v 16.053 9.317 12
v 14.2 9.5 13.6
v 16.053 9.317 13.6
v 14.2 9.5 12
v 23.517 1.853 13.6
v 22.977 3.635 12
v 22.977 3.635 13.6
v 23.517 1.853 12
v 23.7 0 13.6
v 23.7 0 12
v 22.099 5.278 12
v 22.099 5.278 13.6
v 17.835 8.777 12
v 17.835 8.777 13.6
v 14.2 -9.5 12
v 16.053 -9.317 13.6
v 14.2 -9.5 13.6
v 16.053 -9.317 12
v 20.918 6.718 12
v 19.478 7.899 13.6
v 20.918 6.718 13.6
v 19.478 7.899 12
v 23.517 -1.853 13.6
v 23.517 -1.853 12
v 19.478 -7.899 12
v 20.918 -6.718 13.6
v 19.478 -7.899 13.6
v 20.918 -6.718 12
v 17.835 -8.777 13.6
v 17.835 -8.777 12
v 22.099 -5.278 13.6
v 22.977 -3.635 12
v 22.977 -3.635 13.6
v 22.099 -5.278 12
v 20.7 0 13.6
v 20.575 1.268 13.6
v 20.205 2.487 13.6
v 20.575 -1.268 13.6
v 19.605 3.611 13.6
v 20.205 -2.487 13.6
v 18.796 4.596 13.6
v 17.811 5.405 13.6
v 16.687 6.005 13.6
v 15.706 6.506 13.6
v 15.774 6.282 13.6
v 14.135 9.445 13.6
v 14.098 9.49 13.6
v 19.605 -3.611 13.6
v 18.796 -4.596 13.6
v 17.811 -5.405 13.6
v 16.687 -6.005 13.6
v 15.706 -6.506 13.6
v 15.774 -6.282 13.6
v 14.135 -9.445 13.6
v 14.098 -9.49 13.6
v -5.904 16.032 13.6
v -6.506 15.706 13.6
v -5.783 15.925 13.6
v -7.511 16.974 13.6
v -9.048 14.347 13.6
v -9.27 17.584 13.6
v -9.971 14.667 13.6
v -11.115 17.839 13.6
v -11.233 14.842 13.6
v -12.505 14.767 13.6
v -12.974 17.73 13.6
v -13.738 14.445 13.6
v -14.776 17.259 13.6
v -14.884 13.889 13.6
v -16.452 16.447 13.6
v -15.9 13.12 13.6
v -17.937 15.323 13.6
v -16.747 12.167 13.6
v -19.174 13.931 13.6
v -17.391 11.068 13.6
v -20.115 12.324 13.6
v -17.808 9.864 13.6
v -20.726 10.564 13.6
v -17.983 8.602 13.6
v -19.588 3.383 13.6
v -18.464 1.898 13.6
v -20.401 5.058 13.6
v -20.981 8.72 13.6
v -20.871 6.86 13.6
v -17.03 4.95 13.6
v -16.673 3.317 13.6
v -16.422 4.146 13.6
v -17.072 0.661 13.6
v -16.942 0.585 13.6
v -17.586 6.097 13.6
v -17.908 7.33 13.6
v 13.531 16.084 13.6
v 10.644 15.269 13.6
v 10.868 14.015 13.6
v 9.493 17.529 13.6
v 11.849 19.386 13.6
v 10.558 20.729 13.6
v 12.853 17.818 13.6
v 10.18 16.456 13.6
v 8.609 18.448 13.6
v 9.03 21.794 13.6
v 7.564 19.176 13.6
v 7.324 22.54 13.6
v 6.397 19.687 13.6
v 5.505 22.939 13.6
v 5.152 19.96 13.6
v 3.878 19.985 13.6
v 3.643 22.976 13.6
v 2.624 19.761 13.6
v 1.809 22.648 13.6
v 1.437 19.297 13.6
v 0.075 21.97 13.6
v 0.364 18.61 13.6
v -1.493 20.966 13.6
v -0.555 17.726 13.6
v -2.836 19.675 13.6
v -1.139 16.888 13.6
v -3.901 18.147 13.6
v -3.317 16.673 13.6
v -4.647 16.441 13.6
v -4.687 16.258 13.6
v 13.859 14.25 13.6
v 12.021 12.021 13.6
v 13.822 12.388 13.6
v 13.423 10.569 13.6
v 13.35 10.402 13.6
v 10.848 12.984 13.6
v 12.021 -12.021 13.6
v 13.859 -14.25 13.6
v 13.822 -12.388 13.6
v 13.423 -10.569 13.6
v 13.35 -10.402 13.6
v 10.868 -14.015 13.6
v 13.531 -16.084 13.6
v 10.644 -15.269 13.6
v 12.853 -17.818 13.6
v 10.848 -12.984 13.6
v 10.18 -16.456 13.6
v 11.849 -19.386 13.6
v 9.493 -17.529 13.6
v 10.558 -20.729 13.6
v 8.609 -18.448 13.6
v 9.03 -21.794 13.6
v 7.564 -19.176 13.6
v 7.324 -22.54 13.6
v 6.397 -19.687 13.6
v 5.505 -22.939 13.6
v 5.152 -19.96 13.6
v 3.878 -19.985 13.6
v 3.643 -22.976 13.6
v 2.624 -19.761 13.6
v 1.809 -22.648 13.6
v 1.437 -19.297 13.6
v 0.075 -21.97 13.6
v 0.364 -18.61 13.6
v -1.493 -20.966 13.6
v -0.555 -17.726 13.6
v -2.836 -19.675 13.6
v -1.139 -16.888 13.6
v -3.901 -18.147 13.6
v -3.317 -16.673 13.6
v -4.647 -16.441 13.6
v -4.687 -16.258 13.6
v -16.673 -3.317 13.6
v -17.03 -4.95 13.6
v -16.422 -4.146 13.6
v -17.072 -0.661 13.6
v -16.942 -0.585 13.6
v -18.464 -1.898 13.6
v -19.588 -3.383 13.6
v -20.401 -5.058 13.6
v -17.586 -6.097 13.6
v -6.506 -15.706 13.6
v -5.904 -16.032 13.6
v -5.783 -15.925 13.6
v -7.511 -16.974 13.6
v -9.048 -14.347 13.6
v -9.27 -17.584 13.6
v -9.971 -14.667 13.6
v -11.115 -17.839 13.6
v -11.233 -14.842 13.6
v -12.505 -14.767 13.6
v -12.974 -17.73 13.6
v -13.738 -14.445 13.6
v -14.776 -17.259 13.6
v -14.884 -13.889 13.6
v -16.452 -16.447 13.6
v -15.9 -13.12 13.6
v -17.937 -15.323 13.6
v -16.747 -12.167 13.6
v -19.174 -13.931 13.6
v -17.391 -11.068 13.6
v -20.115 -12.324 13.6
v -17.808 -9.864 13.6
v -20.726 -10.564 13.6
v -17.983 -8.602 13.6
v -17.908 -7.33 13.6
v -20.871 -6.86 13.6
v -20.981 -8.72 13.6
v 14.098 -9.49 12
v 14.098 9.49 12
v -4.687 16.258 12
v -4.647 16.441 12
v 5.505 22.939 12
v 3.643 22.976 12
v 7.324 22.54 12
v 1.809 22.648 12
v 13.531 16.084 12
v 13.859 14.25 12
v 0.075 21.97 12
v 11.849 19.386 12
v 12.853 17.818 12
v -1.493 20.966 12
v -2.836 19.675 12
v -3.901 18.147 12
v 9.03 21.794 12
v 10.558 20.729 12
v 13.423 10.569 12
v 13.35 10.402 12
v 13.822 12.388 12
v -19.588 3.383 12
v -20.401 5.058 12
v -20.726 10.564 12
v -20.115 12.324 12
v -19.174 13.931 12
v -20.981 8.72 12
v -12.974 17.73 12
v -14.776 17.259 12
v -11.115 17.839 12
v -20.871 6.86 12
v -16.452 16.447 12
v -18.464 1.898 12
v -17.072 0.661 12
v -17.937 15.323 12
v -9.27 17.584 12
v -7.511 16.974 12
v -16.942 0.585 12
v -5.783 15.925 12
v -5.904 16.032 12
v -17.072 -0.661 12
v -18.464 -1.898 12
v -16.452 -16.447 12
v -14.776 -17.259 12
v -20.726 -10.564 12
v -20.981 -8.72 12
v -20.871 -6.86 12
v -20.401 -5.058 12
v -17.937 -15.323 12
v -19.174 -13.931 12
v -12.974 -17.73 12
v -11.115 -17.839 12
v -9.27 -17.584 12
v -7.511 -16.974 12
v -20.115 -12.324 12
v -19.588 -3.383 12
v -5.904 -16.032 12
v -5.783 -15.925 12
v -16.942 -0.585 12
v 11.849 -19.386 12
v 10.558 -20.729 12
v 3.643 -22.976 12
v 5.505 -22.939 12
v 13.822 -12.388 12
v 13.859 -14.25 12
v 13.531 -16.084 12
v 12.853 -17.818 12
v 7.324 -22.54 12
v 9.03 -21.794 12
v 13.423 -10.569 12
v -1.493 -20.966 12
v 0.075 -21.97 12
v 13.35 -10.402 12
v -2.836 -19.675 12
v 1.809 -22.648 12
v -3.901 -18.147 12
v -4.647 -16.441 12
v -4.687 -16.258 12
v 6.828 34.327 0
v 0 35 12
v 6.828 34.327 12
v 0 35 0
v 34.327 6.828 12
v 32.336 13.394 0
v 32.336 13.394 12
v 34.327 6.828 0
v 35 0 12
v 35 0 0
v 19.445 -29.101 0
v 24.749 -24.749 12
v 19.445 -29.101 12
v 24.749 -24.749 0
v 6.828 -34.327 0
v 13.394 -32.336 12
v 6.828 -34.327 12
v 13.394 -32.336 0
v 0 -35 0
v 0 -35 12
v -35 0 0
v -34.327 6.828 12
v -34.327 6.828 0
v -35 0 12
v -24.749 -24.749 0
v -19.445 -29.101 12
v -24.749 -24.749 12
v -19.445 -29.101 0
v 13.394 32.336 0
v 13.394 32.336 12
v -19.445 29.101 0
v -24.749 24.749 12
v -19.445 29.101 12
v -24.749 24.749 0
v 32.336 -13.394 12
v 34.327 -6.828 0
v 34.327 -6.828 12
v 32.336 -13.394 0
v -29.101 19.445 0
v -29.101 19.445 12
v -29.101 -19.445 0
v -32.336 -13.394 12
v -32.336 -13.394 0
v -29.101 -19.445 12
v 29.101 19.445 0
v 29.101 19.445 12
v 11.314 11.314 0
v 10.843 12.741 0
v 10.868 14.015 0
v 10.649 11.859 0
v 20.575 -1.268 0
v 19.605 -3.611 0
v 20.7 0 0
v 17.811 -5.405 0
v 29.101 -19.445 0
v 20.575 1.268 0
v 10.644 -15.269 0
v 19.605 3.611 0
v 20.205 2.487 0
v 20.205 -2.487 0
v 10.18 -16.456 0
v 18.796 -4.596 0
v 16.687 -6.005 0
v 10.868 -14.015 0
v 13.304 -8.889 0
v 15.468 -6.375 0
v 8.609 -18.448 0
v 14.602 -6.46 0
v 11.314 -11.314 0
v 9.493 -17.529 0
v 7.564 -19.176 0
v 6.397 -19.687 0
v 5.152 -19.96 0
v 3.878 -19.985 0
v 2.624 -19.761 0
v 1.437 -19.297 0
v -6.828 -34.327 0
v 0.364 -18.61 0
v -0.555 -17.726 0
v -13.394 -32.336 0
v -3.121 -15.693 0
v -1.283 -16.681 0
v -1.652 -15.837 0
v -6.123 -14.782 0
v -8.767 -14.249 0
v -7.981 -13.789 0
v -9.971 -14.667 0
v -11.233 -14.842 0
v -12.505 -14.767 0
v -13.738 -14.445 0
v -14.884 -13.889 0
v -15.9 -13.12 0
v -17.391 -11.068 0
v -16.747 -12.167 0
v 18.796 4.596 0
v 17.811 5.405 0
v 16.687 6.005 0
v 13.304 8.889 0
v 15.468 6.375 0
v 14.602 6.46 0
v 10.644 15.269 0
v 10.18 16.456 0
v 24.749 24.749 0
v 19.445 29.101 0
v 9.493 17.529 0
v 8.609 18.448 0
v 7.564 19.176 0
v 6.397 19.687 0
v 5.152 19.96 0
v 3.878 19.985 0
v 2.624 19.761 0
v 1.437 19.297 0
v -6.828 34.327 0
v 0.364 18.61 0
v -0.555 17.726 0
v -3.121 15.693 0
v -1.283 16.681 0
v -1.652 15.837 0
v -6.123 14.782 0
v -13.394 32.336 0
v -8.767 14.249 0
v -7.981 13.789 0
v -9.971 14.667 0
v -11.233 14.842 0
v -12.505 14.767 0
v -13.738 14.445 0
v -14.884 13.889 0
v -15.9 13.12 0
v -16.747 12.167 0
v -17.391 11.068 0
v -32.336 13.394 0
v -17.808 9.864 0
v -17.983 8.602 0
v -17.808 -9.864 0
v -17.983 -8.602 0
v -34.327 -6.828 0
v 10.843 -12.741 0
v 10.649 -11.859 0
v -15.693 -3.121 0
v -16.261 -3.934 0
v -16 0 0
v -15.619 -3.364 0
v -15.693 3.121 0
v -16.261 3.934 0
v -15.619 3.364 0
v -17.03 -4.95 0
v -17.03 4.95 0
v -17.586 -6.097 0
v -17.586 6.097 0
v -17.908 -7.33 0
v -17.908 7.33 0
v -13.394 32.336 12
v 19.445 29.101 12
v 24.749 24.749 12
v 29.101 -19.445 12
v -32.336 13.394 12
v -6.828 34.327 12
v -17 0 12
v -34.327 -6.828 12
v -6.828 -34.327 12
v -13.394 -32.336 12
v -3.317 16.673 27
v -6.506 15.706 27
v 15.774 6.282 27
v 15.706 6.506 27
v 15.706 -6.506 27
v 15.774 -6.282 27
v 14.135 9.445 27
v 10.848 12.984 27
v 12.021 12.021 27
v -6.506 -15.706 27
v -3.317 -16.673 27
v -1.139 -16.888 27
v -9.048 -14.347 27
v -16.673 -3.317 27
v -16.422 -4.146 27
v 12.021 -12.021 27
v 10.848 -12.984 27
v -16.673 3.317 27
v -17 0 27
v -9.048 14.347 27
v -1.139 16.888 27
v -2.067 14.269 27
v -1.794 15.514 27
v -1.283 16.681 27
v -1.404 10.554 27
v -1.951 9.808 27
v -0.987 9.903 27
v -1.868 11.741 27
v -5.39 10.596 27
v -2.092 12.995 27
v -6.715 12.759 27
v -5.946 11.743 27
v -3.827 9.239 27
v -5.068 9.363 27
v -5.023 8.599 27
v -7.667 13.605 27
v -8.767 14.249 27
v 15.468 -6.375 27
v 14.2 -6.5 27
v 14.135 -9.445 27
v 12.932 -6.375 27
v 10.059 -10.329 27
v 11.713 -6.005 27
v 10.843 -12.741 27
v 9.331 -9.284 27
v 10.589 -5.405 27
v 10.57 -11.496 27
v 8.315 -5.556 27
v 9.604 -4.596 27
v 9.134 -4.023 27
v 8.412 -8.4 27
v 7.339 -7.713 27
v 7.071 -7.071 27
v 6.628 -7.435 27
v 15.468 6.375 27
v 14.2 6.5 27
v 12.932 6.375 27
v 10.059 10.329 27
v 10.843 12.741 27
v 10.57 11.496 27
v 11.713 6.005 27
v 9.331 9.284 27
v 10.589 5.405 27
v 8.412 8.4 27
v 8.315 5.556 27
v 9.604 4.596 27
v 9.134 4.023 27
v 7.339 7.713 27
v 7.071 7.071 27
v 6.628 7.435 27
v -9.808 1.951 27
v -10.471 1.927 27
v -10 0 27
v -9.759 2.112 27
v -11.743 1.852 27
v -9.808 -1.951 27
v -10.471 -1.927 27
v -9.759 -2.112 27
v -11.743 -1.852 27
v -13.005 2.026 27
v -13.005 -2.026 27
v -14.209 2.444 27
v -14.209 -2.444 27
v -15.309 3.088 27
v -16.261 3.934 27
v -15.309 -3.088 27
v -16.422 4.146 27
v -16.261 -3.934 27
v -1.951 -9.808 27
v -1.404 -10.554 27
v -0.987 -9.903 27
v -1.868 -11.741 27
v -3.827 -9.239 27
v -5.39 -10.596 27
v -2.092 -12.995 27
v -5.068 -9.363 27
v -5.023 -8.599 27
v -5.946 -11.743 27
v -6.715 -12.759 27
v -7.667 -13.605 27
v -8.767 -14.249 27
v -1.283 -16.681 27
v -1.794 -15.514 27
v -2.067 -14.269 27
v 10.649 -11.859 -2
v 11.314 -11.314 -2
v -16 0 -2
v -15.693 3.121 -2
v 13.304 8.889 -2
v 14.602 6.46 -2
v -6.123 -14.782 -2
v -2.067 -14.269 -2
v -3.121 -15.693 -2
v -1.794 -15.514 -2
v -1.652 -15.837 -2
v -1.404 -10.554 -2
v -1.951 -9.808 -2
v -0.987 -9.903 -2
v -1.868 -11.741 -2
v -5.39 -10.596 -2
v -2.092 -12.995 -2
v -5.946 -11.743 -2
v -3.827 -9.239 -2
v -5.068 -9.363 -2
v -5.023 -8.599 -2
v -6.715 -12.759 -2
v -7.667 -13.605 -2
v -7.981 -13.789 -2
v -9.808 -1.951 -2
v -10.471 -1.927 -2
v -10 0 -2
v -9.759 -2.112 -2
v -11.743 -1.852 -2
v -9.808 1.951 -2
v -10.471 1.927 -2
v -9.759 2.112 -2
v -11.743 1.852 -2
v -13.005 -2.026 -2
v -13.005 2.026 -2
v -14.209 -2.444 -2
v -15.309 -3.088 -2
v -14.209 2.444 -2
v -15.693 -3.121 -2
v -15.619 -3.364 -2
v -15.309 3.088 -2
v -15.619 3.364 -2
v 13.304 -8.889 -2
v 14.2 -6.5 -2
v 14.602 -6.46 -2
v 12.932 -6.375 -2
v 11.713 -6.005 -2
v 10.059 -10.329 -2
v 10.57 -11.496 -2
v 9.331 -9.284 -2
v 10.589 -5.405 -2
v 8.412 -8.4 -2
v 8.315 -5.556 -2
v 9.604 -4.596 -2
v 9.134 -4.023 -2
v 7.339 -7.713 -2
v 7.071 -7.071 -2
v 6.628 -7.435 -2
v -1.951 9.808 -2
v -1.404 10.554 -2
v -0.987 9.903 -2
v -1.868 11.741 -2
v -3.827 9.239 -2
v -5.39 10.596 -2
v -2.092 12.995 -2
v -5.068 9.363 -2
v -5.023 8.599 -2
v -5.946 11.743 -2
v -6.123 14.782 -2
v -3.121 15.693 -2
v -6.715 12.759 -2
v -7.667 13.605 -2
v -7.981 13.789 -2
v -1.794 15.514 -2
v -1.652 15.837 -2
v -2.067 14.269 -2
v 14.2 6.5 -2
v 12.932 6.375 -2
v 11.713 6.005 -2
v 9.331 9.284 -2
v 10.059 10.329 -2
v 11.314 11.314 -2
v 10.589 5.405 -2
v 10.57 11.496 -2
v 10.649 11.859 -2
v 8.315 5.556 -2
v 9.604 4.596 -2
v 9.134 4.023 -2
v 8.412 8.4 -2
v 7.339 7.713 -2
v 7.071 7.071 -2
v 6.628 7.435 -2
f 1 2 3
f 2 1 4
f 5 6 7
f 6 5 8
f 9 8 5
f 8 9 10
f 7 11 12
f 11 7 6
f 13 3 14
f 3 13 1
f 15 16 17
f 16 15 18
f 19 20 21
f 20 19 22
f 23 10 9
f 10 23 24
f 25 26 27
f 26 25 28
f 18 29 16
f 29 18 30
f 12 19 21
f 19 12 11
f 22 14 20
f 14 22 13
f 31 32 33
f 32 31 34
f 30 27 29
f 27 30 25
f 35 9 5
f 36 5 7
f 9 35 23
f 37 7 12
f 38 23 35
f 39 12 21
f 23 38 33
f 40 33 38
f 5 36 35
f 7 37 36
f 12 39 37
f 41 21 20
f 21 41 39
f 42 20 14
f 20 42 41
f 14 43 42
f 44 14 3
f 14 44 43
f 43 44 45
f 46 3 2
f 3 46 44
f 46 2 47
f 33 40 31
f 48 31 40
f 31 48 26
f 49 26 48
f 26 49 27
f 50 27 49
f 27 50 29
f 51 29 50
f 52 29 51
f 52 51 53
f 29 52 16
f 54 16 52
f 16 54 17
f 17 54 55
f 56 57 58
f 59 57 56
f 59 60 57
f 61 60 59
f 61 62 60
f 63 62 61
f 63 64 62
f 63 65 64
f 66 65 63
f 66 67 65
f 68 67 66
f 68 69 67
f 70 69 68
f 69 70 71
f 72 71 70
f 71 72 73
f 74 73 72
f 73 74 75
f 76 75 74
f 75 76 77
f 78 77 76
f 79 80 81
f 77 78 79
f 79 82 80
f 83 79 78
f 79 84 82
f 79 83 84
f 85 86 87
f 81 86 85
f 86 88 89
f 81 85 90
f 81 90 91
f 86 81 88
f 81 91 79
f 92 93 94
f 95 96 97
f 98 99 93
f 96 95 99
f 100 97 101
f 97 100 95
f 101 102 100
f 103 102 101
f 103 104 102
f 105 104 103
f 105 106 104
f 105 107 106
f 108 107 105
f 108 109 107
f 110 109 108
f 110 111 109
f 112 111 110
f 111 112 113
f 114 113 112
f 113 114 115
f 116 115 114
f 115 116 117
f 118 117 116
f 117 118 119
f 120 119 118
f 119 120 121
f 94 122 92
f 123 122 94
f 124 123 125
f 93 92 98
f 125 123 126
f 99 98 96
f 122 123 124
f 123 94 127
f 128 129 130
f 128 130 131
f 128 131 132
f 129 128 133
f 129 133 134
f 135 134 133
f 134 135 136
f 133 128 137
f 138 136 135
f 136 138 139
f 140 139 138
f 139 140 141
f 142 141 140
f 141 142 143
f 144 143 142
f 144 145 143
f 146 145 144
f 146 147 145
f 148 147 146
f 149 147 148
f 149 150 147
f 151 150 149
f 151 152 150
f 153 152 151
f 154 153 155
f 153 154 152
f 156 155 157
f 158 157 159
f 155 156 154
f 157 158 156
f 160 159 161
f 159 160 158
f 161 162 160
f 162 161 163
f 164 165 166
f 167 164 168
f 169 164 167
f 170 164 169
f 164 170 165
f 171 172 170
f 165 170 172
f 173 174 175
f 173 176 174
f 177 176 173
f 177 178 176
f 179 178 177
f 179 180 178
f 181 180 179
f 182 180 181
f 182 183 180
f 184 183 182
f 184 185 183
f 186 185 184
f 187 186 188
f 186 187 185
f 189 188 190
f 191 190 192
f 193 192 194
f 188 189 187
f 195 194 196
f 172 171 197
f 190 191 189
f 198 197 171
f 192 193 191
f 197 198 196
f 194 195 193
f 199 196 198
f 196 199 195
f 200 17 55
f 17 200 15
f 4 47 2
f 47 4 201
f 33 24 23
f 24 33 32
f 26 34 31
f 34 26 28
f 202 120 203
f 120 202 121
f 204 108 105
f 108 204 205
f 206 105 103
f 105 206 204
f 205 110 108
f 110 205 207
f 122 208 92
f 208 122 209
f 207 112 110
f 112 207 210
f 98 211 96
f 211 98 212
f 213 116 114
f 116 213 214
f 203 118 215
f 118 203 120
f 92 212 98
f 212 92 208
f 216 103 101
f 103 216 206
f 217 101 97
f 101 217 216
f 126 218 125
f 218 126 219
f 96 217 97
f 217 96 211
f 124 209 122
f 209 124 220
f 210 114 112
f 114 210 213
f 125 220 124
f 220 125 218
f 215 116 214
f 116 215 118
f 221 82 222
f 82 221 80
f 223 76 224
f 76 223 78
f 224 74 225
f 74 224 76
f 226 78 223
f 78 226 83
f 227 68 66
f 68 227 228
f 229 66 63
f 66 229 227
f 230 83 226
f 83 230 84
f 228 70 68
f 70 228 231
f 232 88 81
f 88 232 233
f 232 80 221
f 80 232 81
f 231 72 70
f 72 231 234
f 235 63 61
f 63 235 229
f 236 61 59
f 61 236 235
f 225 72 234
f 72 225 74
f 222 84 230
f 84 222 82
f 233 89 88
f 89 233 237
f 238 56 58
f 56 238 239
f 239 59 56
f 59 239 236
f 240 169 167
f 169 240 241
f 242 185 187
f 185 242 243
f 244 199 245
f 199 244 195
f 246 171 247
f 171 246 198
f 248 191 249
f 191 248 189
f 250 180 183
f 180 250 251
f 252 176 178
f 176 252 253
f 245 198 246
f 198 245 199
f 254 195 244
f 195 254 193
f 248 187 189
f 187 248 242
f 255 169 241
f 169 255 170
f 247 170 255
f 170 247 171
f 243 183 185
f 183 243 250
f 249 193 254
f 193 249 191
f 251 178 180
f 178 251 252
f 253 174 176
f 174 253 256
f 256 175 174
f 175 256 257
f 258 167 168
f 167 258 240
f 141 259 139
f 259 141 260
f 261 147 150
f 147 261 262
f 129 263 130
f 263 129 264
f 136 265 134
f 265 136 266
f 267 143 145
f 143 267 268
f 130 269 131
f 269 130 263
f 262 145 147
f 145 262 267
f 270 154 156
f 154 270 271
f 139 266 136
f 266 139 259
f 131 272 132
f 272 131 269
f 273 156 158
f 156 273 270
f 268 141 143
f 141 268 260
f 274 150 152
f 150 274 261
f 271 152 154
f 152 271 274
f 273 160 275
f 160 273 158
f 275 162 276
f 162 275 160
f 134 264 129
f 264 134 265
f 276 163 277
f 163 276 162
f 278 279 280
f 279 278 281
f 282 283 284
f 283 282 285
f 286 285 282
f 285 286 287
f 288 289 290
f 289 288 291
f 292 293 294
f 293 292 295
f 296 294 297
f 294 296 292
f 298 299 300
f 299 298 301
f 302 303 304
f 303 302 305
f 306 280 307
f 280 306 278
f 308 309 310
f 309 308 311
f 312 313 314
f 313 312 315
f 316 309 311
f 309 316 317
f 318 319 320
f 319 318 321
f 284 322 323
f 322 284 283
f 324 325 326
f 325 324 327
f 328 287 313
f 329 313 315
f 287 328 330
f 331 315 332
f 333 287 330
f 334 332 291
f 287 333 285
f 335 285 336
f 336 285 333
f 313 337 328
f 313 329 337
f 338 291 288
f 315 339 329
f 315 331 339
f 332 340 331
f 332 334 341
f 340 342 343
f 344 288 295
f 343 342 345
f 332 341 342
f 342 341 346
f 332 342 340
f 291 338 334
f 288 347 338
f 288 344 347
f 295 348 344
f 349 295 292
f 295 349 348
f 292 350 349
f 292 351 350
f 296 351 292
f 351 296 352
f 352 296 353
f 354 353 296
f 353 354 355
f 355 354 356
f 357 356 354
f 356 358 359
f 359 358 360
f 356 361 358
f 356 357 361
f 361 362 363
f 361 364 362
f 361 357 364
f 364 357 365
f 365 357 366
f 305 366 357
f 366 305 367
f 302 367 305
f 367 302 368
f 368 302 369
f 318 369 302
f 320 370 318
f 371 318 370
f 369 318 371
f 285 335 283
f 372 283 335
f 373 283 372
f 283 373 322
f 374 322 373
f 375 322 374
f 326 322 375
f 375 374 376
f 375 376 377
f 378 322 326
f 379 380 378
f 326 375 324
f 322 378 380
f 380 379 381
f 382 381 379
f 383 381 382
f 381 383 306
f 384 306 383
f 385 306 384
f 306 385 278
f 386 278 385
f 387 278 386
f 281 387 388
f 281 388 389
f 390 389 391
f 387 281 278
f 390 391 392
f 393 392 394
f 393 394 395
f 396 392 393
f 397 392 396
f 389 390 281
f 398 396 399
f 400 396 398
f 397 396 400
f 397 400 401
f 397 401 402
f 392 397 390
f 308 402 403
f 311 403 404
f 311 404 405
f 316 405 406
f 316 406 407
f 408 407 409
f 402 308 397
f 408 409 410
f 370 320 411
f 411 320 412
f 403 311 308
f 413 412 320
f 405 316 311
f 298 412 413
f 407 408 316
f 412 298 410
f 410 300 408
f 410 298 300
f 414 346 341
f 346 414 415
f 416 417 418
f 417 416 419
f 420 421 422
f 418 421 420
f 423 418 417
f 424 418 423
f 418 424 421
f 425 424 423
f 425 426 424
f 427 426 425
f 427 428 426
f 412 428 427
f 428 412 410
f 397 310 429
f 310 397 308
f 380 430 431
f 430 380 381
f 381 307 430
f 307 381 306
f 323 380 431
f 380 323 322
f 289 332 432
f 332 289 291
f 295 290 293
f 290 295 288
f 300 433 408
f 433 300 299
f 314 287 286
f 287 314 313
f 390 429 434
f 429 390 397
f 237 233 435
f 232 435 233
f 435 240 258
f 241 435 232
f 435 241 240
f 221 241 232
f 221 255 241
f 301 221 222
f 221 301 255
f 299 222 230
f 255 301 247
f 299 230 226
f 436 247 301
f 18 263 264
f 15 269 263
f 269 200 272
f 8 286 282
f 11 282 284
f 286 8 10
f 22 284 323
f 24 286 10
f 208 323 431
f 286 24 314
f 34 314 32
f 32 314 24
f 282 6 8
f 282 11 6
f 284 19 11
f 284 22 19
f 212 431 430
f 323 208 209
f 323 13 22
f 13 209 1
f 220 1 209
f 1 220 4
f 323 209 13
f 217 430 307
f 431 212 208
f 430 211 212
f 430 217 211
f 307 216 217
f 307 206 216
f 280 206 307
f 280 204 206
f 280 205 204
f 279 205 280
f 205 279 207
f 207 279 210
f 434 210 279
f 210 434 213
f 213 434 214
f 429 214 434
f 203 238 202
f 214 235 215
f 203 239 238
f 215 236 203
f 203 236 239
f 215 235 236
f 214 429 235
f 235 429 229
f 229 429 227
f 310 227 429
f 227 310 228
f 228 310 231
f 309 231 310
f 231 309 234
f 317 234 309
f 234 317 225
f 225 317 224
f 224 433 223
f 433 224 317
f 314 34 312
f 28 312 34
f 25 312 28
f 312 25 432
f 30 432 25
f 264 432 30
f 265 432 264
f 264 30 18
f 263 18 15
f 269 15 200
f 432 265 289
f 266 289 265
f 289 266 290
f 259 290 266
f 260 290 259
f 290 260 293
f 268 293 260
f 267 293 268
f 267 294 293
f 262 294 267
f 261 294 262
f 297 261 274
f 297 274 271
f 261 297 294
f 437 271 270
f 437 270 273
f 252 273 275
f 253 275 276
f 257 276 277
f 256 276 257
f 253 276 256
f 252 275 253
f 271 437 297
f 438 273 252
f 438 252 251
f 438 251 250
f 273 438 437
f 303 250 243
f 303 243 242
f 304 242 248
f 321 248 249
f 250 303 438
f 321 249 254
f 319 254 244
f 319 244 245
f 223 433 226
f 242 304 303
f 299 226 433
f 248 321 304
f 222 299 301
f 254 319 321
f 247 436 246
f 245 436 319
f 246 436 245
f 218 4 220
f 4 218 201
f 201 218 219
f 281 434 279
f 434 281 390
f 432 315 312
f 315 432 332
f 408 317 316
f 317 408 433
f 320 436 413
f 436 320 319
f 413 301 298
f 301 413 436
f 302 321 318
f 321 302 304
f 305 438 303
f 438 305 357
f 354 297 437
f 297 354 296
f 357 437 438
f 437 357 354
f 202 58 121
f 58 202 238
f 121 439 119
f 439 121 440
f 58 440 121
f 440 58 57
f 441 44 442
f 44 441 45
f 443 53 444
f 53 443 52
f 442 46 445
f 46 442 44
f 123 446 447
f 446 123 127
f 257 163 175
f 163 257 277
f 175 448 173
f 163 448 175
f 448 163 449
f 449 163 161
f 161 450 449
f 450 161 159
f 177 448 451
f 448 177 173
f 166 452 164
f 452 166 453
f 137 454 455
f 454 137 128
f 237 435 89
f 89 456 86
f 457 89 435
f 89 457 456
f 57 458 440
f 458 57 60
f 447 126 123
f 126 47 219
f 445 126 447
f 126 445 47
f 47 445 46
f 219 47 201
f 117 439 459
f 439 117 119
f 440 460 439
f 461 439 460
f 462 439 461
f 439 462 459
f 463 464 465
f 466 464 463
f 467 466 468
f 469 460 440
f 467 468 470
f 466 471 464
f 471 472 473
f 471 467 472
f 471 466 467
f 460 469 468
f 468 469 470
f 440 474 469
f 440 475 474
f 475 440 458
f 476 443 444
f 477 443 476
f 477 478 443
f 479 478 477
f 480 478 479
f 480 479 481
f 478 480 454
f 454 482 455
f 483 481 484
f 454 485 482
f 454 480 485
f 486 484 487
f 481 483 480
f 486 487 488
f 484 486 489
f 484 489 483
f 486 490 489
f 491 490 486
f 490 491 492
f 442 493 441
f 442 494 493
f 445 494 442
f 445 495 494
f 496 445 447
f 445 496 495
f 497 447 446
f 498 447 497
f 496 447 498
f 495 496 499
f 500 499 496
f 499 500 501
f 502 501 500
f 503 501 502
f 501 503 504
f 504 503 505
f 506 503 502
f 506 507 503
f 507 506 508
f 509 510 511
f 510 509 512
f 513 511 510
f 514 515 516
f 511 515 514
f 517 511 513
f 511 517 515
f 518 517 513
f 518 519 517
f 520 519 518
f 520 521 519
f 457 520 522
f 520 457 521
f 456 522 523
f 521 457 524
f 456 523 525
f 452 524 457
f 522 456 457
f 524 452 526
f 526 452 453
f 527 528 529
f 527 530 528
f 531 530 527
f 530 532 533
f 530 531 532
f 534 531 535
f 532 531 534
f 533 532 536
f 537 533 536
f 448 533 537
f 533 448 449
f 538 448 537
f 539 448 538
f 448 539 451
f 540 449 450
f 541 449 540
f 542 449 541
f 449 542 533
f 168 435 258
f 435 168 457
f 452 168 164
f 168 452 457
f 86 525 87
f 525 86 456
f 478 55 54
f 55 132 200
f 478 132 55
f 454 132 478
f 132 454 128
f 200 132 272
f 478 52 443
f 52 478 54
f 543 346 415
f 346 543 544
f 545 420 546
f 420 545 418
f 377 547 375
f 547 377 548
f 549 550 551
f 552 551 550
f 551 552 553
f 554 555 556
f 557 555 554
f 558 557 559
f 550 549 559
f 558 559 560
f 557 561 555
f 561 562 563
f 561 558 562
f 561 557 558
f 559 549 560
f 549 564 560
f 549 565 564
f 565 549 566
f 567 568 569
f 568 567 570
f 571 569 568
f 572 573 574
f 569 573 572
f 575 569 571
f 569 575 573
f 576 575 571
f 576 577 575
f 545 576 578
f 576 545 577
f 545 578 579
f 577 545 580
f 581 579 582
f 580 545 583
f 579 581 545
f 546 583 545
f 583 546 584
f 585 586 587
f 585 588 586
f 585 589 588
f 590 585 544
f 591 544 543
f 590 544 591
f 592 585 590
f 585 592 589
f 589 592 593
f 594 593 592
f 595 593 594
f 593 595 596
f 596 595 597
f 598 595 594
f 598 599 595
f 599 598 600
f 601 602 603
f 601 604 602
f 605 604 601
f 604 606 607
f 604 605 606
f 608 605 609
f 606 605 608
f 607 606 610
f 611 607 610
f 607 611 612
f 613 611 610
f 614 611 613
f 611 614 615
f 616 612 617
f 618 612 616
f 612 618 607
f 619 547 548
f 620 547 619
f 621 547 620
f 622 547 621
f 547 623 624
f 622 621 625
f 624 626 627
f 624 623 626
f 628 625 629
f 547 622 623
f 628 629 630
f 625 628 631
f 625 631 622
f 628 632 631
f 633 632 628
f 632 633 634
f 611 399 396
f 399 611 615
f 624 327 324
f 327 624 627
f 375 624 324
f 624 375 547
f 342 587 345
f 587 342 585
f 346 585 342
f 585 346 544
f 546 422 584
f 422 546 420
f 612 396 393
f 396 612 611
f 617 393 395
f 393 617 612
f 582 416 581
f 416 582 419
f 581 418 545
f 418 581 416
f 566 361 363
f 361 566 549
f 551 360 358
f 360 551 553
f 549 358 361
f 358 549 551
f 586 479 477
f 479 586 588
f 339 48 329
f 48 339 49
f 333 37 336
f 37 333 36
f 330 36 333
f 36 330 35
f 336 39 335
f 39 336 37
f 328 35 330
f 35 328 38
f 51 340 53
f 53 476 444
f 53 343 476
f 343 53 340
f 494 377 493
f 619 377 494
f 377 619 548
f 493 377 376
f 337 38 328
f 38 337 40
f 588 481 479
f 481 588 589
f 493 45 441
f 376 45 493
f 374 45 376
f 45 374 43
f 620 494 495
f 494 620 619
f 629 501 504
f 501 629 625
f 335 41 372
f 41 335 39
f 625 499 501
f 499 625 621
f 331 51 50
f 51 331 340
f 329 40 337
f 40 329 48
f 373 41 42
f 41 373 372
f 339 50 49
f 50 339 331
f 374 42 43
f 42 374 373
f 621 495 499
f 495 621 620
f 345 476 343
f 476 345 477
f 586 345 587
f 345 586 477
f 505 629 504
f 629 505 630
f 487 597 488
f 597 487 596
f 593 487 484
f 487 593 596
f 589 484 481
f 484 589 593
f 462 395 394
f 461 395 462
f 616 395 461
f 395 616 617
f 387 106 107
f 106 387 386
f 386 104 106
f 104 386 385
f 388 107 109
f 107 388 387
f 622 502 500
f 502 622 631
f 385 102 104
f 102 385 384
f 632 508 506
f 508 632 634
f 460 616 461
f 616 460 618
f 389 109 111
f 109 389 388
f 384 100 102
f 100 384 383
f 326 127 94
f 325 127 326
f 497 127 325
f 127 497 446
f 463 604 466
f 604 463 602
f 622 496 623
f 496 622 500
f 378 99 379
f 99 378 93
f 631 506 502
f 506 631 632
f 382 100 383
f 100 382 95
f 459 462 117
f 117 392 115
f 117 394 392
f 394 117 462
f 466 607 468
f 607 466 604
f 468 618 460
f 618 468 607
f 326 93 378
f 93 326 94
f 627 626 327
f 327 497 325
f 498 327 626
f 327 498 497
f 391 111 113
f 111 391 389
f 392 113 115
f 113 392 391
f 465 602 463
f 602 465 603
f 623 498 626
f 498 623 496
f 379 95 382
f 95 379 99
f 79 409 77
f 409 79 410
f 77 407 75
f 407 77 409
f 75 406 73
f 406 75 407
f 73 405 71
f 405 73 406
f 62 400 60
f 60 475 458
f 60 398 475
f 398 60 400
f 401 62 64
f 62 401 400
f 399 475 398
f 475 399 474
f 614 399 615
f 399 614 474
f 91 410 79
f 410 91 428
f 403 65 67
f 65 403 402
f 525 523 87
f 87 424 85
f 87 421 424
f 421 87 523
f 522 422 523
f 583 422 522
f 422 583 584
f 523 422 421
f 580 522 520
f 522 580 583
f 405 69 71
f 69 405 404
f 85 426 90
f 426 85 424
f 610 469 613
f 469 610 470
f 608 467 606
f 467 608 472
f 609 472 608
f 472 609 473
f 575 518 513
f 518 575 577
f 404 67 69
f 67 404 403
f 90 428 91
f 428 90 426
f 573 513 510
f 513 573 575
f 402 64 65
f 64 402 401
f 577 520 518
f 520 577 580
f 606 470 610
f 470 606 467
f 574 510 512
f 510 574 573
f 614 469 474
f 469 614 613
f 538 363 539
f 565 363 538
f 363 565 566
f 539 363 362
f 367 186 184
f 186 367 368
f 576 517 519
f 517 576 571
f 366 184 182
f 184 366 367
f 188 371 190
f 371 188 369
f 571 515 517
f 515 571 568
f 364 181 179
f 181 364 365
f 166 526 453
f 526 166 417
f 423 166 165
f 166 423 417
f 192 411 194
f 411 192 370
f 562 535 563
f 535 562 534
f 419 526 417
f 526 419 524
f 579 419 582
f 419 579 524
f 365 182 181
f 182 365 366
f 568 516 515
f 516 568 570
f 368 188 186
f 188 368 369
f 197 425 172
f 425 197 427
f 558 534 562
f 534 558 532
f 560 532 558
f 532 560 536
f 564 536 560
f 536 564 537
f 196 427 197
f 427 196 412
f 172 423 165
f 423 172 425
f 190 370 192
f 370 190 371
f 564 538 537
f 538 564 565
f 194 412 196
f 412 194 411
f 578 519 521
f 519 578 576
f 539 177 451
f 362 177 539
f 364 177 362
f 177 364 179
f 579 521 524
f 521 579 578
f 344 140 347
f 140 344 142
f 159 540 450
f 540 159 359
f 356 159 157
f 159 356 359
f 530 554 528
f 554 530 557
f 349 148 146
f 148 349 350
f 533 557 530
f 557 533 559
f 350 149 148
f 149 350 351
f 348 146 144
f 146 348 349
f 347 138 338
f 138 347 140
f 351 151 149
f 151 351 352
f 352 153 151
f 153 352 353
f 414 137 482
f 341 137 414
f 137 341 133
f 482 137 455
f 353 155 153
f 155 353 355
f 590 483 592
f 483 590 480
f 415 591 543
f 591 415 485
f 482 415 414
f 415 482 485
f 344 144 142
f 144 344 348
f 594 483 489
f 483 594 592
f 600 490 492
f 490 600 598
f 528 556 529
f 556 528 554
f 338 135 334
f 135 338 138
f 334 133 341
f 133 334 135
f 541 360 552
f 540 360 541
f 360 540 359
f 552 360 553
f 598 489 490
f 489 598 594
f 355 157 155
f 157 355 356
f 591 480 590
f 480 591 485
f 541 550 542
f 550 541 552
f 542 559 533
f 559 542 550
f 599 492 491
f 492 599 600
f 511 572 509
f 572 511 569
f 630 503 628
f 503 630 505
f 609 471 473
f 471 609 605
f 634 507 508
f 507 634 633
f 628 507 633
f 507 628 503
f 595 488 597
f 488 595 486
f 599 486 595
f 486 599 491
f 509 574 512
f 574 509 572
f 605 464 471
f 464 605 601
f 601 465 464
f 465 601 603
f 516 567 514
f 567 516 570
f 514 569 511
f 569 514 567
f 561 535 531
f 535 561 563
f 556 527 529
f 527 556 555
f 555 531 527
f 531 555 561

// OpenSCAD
$fn = 32;

// ----------------------------------------------------------------------
// Bolt-circle flange: 70 mm outside, 5 bolt holes, bore 20 mm
// ----------------------------------------------------------------------

// --- parameters (mm) ---
flange_d = 70;            // flange outside diameter
flange_t = 12;            // flange thickness
bolts = 5;                // number of bolt holes
bolt_d = 13;              // bolt clearance
bolt_r = 14.2;            // bolt circle radius
bore_d = 20;              // centre bore
hub_d = 34;               // raised hub diameter
hub_h = 15;               // raised hub height
spigot_d = 32;            // spigot diameter
spigot_h = 3;             // spigot height below the flange
sink = 1;                 // overlap into the flange
spot_d = 19;              // spot faced bosses
spot_h = 1.6;             // spot face height

module body() {
  cylinder(h = flange_t, d = flange_d);
  /* raised hub, sunk 1 mm into the flange */
  translate([0, 0, flange_t - 1]) cylinder(h = hub_h + 1, d = hub_d);
  /* spigot on the back face, sunk into the flange */
  translate([0, 0, -spigot_h + sink]) cylinder(h = spigot_h, d = spigot_d);
  /* spot faced pads under the bolt heads */
  for (i = [0 : bolts - 1]) rotate([0, 0, i * 360 / bolts]) translate([bolt_r, 0, flange_t - 1]) cylinder(h = spot_h + 1, d = spot_d);
}

difference() {
  body();
  /* bolt circle */
  for (i = [0 : bolts - 1]) rotate([0, 0, i * 360 / bolts]) translate([bolt_r, 0, -spigot_h - 1]) cylinder(h = flange_t + hub_h + spigot_h + 3, d = bolt_d);
  translate([0, 0, -spigot_h - 1]) cylinder(h = flange_t + hub_h + spigot_h + 3, d = bore_d);
}
